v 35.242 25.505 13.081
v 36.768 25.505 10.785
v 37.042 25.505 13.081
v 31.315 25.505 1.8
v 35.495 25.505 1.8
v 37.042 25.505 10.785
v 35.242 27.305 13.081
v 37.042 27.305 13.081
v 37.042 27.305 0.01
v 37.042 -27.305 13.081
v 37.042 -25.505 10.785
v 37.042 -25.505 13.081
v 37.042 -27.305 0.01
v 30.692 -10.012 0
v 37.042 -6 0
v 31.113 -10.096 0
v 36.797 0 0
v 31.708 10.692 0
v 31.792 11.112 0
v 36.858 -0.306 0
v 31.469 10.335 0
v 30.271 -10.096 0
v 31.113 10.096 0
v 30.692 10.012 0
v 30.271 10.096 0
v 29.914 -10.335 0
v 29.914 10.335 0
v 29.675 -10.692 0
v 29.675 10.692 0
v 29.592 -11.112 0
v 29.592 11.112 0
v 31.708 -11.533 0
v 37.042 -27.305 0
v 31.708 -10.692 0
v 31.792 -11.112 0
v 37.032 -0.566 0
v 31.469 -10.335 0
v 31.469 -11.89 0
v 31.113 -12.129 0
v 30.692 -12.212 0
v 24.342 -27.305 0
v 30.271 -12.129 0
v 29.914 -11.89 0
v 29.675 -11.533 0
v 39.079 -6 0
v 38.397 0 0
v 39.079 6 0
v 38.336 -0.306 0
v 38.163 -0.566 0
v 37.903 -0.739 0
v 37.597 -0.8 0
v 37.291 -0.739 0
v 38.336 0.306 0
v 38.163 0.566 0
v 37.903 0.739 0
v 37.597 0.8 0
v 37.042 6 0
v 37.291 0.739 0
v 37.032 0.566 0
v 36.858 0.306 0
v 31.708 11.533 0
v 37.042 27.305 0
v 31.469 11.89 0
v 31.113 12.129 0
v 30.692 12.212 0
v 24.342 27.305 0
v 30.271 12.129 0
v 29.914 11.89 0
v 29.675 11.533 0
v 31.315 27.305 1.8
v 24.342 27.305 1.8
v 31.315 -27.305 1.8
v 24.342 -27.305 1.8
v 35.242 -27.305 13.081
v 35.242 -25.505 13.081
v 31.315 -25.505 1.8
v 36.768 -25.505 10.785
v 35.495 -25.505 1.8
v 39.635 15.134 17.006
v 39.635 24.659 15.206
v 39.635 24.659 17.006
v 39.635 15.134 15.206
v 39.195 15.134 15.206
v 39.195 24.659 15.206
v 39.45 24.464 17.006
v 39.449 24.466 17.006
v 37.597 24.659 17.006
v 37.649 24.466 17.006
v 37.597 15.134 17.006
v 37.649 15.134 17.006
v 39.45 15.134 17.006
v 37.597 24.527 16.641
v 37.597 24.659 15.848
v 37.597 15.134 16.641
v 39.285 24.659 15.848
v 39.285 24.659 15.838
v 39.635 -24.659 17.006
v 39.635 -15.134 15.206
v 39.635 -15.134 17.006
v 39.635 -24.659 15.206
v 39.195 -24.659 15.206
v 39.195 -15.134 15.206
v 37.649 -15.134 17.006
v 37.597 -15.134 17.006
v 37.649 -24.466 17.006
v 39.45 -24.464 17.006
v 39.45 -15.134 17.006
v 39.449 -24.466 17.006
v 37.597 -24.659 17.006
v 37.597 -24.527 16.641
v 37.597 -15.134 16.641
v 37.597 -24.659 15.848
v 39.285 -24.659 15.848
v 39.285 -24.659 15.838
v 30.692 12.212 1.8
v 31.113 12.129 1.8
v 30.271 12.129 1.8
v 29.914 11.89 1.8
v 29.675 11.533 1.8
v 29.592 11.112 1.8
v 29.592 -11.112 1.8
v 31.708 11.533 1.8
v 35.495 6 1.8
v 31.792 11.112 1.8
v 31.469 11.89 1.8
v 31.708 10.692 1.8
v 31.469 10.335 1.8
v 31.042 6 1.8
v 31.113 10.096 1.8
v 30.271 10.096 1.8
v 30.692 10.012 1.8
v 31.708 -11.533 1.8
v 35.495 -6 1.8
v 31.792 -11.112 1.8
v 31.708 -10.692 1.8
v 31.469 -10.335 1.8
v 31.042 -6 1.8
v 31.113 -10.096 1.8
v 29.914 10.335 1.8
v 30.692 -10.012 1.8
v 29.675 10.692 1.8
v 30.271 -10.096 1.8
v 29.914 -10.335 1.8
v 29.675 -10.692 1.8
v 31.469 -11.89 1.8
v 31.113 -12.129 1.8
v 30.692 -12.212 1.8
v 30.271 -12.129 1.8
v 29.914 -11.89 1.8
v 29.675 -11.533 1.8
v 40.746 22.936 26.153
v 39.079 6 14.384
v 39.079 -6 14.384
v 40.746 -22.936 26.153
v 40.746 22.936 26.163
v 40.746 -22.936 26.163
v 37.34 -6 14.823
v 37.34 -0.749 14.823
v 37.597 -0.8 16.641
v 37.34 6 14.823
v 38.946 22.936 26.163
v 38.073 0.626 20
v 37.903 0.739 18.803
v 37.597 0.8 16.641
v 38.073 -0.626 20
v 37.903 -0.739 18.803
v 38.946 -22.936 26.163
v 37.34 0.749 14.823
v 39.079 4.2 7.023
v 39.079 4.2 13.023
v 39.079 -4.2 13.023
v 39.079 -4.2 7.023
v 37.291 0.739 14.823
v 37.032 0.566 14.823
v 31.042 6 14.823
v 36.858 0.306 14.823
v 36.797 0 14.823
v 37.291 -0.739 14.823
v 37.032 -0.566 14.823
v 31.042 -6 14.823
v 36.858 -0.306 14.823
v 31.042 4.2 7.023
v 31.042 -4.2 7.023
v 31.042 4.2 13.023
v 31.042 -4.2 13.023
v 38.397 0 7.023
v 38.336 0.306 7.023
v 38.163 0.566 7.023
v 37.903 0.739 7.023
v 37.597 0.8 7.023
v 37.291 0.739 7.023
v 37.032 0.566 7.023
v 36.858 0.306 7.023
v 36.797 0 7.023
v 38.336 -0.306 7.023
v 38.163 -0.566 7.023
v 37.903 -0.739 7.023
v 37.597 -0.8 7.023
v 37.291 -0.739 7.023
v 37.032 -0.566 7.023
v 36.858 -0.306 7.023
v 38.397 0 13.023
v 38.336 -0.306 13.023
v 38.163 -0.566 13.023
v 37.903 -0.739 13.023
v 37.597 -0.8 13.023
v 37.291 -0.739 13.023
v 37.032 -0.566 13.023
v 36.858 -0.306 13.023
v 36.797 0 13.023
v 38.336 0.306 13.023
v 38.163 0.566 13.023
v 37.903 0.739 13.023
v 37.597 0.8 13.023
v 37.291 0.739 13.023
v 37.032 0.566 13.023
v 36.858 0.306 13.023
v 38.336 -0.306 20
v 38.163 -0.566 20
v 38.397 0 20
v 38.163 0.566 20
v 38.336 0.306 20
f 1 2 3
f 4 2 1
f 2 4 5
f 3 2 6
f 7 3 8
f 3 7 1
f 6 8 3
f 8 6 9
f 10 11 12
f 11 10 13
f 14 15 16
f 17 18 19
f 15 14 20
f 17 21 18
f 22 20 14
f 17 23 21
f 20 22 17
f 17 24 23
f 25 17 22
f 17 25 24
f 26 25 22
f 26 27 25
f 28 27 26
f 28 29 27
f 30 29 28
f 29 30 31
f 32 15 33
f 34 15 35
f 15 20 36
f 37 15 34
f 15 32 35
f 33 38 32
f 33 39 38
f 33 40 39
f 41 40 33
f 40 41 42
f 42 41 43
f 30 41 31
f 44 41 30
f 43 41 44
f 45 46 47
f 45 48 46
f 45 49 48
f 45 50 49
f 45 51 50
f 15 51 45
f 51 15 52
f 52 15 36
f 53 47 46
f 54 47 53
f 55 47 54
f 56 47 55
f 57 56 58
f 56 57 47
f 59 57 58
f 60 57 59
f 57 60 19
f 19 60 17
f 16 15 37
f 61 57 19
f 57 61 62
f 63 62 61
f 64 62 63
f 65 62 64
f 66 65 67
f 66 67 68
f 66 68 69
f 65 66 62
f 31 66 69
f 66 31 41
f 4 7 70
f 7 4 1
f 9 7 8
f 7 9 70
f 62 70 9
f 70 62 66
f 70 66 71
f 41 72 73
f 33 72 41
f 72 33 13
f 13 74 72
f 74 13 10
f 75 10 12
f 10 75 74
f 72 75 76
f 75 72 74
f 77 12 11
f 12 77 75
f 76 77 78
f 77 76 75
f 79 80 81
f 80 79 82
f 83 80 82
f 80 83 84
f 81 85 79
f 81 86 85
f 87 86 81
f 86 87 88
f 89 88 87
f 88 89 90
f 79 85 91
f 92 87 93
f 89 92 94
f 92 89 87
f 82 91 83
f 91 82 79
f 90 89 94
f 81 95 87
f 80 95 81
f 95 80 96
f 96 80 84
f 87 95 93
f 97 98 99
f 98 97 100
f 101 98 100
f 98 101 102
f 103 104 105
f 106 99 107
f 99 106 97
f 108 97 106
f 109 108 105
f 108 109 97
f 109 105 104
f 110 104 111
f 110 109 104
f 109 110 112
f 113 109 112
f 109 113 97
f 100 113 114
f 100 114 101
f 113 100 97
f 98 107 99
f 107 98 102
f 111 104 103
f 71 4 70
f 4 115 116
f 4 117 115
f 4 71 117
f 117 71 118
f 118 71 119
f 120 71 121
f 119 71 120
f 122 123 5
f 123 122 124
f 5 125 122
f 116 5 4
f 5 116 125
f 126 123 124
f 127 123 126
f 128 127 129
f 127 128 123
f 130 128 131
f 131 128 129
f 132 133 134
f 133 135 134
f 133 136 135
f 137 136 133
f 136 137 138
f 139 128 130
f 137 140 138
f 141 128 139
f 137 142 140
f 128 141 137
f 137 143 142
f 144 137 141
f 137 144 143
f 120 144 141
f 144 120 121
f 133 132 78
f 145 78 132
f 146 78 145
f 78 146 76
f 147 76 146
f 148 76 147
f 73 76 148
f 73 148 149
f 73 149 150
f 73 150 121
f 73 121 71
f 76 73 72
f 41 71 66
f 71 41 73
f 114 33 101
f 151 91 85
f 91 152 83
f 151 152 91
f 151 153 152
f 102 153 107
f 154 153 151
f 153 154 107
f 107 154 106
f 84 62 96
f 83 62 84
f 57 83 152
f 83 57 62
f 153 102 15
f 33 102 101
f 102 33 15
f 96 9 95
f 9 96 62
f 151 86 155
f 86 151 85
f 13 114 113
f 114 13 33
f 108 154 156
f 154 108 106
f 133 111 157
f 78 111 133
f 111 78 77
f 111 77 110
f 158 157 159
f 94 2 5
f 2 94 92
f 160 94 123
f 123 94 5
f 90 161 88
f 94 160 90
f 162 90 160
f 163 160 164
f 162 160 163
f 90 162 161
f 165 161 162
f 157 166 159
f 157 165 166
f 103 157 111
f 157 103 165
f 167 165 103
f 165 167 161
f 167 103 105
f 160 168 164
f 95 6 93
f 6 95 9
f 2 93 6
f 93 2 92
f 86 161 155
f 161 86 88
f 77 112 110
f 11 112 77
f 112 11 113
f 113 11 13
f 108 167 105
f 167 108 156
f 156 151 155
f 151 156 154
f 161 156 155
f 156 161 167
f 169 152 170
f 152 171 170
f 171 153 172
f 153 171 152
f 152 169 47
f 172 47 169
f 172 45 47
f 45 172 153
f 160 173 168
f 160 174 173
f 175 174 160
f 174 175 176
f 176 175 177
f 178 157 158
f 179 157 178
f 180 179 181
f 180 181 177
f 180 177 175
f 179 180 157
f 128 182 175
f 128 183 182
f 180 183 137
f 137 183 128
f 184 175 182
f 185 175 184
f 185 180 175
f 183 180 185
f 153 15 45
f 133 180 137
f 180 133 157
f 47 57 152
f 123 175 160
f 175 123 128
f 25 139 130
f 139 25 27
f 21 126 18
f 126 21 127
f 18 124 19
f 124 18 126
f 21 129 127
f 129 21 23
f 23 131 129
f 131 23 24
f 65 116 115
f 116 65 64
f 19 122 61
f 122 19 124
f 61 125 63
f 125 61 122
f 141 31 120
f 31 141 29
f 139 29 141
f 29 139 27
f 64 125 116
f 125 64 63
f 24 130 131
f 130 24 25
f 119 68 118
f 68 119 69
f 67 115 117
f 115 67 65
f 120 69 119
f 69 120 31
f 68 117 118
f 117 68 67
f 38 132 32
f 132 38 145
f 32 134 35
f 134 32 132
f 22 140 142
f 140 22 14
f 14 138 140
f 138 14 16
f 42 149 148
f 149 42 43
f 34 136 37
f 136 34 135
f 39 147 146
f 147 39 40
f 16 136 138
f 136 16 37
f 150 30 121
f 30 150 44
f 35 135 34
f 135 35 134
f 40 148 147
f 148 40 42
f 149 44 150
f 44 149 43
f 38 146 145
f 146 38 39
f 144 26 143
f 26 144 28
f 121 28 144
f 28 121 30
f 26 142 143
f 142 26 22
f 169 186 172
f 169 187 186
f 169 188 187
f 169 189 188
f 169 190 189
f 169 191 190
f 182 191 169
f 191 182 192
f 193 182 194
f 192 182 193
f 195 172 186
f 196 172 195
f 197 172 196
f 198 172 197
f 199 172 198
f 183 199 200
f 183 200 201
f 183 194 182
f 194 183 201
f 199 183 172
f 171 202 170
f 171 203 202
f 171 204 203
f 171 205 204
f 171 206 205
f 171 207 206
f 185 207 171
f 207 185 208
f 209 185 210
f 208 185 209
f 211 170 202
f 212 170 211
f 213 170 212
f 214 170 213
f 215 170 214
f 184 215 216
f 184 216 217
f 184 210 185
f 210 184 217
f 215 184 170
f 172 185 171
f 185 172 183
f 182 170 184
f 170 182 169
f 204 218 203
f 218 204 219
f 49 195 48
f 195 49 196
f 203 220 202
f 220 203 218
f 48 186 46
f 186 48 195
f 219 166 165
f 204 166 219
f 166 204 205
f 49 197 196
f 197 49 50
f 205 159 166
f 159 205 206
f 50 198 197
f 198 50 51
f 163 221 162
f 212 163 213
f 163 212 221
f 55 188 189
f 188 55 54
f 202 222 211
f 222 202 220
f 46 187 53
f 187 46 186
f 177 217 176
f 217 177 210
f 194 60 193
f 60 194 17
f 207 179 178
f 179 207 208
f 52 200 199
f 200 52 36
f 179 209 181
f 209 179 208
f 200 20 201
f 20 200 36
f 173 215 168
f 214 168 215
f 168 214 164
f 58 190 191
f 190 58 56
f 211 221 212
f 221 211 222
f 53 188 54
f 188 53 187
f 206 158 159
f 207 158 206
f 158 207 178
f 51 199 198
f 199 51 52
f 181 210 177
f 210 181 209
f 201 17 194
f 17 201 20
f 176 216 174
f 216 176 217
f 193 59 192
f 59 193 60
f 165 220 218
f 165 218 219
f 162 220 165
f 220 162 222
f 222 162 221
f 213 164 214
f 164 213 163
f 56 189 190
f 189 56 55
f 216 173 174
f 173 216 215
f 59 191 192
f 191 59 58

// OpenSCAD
// Milwaukee Road Little Joe, O scale 1-48 - print 12 of 17: pilot - pilot with coupler pocket - print 2
// Render (F6), export STL, print. Settings: ../../library/lj_params.scad
// Whole loco preview and notes: ../../MILW_LittleJoe_Main.scad
SCALE_SEL = "O";
LOCO_SEL = "E70";   // [E20, E21, E70, E71, E72, E73, E74, E75, E76, E77, E78, E79] the body and roof change for E20 / E21
include <../../library/lj_all.scad>
lj_plate("pilot");
